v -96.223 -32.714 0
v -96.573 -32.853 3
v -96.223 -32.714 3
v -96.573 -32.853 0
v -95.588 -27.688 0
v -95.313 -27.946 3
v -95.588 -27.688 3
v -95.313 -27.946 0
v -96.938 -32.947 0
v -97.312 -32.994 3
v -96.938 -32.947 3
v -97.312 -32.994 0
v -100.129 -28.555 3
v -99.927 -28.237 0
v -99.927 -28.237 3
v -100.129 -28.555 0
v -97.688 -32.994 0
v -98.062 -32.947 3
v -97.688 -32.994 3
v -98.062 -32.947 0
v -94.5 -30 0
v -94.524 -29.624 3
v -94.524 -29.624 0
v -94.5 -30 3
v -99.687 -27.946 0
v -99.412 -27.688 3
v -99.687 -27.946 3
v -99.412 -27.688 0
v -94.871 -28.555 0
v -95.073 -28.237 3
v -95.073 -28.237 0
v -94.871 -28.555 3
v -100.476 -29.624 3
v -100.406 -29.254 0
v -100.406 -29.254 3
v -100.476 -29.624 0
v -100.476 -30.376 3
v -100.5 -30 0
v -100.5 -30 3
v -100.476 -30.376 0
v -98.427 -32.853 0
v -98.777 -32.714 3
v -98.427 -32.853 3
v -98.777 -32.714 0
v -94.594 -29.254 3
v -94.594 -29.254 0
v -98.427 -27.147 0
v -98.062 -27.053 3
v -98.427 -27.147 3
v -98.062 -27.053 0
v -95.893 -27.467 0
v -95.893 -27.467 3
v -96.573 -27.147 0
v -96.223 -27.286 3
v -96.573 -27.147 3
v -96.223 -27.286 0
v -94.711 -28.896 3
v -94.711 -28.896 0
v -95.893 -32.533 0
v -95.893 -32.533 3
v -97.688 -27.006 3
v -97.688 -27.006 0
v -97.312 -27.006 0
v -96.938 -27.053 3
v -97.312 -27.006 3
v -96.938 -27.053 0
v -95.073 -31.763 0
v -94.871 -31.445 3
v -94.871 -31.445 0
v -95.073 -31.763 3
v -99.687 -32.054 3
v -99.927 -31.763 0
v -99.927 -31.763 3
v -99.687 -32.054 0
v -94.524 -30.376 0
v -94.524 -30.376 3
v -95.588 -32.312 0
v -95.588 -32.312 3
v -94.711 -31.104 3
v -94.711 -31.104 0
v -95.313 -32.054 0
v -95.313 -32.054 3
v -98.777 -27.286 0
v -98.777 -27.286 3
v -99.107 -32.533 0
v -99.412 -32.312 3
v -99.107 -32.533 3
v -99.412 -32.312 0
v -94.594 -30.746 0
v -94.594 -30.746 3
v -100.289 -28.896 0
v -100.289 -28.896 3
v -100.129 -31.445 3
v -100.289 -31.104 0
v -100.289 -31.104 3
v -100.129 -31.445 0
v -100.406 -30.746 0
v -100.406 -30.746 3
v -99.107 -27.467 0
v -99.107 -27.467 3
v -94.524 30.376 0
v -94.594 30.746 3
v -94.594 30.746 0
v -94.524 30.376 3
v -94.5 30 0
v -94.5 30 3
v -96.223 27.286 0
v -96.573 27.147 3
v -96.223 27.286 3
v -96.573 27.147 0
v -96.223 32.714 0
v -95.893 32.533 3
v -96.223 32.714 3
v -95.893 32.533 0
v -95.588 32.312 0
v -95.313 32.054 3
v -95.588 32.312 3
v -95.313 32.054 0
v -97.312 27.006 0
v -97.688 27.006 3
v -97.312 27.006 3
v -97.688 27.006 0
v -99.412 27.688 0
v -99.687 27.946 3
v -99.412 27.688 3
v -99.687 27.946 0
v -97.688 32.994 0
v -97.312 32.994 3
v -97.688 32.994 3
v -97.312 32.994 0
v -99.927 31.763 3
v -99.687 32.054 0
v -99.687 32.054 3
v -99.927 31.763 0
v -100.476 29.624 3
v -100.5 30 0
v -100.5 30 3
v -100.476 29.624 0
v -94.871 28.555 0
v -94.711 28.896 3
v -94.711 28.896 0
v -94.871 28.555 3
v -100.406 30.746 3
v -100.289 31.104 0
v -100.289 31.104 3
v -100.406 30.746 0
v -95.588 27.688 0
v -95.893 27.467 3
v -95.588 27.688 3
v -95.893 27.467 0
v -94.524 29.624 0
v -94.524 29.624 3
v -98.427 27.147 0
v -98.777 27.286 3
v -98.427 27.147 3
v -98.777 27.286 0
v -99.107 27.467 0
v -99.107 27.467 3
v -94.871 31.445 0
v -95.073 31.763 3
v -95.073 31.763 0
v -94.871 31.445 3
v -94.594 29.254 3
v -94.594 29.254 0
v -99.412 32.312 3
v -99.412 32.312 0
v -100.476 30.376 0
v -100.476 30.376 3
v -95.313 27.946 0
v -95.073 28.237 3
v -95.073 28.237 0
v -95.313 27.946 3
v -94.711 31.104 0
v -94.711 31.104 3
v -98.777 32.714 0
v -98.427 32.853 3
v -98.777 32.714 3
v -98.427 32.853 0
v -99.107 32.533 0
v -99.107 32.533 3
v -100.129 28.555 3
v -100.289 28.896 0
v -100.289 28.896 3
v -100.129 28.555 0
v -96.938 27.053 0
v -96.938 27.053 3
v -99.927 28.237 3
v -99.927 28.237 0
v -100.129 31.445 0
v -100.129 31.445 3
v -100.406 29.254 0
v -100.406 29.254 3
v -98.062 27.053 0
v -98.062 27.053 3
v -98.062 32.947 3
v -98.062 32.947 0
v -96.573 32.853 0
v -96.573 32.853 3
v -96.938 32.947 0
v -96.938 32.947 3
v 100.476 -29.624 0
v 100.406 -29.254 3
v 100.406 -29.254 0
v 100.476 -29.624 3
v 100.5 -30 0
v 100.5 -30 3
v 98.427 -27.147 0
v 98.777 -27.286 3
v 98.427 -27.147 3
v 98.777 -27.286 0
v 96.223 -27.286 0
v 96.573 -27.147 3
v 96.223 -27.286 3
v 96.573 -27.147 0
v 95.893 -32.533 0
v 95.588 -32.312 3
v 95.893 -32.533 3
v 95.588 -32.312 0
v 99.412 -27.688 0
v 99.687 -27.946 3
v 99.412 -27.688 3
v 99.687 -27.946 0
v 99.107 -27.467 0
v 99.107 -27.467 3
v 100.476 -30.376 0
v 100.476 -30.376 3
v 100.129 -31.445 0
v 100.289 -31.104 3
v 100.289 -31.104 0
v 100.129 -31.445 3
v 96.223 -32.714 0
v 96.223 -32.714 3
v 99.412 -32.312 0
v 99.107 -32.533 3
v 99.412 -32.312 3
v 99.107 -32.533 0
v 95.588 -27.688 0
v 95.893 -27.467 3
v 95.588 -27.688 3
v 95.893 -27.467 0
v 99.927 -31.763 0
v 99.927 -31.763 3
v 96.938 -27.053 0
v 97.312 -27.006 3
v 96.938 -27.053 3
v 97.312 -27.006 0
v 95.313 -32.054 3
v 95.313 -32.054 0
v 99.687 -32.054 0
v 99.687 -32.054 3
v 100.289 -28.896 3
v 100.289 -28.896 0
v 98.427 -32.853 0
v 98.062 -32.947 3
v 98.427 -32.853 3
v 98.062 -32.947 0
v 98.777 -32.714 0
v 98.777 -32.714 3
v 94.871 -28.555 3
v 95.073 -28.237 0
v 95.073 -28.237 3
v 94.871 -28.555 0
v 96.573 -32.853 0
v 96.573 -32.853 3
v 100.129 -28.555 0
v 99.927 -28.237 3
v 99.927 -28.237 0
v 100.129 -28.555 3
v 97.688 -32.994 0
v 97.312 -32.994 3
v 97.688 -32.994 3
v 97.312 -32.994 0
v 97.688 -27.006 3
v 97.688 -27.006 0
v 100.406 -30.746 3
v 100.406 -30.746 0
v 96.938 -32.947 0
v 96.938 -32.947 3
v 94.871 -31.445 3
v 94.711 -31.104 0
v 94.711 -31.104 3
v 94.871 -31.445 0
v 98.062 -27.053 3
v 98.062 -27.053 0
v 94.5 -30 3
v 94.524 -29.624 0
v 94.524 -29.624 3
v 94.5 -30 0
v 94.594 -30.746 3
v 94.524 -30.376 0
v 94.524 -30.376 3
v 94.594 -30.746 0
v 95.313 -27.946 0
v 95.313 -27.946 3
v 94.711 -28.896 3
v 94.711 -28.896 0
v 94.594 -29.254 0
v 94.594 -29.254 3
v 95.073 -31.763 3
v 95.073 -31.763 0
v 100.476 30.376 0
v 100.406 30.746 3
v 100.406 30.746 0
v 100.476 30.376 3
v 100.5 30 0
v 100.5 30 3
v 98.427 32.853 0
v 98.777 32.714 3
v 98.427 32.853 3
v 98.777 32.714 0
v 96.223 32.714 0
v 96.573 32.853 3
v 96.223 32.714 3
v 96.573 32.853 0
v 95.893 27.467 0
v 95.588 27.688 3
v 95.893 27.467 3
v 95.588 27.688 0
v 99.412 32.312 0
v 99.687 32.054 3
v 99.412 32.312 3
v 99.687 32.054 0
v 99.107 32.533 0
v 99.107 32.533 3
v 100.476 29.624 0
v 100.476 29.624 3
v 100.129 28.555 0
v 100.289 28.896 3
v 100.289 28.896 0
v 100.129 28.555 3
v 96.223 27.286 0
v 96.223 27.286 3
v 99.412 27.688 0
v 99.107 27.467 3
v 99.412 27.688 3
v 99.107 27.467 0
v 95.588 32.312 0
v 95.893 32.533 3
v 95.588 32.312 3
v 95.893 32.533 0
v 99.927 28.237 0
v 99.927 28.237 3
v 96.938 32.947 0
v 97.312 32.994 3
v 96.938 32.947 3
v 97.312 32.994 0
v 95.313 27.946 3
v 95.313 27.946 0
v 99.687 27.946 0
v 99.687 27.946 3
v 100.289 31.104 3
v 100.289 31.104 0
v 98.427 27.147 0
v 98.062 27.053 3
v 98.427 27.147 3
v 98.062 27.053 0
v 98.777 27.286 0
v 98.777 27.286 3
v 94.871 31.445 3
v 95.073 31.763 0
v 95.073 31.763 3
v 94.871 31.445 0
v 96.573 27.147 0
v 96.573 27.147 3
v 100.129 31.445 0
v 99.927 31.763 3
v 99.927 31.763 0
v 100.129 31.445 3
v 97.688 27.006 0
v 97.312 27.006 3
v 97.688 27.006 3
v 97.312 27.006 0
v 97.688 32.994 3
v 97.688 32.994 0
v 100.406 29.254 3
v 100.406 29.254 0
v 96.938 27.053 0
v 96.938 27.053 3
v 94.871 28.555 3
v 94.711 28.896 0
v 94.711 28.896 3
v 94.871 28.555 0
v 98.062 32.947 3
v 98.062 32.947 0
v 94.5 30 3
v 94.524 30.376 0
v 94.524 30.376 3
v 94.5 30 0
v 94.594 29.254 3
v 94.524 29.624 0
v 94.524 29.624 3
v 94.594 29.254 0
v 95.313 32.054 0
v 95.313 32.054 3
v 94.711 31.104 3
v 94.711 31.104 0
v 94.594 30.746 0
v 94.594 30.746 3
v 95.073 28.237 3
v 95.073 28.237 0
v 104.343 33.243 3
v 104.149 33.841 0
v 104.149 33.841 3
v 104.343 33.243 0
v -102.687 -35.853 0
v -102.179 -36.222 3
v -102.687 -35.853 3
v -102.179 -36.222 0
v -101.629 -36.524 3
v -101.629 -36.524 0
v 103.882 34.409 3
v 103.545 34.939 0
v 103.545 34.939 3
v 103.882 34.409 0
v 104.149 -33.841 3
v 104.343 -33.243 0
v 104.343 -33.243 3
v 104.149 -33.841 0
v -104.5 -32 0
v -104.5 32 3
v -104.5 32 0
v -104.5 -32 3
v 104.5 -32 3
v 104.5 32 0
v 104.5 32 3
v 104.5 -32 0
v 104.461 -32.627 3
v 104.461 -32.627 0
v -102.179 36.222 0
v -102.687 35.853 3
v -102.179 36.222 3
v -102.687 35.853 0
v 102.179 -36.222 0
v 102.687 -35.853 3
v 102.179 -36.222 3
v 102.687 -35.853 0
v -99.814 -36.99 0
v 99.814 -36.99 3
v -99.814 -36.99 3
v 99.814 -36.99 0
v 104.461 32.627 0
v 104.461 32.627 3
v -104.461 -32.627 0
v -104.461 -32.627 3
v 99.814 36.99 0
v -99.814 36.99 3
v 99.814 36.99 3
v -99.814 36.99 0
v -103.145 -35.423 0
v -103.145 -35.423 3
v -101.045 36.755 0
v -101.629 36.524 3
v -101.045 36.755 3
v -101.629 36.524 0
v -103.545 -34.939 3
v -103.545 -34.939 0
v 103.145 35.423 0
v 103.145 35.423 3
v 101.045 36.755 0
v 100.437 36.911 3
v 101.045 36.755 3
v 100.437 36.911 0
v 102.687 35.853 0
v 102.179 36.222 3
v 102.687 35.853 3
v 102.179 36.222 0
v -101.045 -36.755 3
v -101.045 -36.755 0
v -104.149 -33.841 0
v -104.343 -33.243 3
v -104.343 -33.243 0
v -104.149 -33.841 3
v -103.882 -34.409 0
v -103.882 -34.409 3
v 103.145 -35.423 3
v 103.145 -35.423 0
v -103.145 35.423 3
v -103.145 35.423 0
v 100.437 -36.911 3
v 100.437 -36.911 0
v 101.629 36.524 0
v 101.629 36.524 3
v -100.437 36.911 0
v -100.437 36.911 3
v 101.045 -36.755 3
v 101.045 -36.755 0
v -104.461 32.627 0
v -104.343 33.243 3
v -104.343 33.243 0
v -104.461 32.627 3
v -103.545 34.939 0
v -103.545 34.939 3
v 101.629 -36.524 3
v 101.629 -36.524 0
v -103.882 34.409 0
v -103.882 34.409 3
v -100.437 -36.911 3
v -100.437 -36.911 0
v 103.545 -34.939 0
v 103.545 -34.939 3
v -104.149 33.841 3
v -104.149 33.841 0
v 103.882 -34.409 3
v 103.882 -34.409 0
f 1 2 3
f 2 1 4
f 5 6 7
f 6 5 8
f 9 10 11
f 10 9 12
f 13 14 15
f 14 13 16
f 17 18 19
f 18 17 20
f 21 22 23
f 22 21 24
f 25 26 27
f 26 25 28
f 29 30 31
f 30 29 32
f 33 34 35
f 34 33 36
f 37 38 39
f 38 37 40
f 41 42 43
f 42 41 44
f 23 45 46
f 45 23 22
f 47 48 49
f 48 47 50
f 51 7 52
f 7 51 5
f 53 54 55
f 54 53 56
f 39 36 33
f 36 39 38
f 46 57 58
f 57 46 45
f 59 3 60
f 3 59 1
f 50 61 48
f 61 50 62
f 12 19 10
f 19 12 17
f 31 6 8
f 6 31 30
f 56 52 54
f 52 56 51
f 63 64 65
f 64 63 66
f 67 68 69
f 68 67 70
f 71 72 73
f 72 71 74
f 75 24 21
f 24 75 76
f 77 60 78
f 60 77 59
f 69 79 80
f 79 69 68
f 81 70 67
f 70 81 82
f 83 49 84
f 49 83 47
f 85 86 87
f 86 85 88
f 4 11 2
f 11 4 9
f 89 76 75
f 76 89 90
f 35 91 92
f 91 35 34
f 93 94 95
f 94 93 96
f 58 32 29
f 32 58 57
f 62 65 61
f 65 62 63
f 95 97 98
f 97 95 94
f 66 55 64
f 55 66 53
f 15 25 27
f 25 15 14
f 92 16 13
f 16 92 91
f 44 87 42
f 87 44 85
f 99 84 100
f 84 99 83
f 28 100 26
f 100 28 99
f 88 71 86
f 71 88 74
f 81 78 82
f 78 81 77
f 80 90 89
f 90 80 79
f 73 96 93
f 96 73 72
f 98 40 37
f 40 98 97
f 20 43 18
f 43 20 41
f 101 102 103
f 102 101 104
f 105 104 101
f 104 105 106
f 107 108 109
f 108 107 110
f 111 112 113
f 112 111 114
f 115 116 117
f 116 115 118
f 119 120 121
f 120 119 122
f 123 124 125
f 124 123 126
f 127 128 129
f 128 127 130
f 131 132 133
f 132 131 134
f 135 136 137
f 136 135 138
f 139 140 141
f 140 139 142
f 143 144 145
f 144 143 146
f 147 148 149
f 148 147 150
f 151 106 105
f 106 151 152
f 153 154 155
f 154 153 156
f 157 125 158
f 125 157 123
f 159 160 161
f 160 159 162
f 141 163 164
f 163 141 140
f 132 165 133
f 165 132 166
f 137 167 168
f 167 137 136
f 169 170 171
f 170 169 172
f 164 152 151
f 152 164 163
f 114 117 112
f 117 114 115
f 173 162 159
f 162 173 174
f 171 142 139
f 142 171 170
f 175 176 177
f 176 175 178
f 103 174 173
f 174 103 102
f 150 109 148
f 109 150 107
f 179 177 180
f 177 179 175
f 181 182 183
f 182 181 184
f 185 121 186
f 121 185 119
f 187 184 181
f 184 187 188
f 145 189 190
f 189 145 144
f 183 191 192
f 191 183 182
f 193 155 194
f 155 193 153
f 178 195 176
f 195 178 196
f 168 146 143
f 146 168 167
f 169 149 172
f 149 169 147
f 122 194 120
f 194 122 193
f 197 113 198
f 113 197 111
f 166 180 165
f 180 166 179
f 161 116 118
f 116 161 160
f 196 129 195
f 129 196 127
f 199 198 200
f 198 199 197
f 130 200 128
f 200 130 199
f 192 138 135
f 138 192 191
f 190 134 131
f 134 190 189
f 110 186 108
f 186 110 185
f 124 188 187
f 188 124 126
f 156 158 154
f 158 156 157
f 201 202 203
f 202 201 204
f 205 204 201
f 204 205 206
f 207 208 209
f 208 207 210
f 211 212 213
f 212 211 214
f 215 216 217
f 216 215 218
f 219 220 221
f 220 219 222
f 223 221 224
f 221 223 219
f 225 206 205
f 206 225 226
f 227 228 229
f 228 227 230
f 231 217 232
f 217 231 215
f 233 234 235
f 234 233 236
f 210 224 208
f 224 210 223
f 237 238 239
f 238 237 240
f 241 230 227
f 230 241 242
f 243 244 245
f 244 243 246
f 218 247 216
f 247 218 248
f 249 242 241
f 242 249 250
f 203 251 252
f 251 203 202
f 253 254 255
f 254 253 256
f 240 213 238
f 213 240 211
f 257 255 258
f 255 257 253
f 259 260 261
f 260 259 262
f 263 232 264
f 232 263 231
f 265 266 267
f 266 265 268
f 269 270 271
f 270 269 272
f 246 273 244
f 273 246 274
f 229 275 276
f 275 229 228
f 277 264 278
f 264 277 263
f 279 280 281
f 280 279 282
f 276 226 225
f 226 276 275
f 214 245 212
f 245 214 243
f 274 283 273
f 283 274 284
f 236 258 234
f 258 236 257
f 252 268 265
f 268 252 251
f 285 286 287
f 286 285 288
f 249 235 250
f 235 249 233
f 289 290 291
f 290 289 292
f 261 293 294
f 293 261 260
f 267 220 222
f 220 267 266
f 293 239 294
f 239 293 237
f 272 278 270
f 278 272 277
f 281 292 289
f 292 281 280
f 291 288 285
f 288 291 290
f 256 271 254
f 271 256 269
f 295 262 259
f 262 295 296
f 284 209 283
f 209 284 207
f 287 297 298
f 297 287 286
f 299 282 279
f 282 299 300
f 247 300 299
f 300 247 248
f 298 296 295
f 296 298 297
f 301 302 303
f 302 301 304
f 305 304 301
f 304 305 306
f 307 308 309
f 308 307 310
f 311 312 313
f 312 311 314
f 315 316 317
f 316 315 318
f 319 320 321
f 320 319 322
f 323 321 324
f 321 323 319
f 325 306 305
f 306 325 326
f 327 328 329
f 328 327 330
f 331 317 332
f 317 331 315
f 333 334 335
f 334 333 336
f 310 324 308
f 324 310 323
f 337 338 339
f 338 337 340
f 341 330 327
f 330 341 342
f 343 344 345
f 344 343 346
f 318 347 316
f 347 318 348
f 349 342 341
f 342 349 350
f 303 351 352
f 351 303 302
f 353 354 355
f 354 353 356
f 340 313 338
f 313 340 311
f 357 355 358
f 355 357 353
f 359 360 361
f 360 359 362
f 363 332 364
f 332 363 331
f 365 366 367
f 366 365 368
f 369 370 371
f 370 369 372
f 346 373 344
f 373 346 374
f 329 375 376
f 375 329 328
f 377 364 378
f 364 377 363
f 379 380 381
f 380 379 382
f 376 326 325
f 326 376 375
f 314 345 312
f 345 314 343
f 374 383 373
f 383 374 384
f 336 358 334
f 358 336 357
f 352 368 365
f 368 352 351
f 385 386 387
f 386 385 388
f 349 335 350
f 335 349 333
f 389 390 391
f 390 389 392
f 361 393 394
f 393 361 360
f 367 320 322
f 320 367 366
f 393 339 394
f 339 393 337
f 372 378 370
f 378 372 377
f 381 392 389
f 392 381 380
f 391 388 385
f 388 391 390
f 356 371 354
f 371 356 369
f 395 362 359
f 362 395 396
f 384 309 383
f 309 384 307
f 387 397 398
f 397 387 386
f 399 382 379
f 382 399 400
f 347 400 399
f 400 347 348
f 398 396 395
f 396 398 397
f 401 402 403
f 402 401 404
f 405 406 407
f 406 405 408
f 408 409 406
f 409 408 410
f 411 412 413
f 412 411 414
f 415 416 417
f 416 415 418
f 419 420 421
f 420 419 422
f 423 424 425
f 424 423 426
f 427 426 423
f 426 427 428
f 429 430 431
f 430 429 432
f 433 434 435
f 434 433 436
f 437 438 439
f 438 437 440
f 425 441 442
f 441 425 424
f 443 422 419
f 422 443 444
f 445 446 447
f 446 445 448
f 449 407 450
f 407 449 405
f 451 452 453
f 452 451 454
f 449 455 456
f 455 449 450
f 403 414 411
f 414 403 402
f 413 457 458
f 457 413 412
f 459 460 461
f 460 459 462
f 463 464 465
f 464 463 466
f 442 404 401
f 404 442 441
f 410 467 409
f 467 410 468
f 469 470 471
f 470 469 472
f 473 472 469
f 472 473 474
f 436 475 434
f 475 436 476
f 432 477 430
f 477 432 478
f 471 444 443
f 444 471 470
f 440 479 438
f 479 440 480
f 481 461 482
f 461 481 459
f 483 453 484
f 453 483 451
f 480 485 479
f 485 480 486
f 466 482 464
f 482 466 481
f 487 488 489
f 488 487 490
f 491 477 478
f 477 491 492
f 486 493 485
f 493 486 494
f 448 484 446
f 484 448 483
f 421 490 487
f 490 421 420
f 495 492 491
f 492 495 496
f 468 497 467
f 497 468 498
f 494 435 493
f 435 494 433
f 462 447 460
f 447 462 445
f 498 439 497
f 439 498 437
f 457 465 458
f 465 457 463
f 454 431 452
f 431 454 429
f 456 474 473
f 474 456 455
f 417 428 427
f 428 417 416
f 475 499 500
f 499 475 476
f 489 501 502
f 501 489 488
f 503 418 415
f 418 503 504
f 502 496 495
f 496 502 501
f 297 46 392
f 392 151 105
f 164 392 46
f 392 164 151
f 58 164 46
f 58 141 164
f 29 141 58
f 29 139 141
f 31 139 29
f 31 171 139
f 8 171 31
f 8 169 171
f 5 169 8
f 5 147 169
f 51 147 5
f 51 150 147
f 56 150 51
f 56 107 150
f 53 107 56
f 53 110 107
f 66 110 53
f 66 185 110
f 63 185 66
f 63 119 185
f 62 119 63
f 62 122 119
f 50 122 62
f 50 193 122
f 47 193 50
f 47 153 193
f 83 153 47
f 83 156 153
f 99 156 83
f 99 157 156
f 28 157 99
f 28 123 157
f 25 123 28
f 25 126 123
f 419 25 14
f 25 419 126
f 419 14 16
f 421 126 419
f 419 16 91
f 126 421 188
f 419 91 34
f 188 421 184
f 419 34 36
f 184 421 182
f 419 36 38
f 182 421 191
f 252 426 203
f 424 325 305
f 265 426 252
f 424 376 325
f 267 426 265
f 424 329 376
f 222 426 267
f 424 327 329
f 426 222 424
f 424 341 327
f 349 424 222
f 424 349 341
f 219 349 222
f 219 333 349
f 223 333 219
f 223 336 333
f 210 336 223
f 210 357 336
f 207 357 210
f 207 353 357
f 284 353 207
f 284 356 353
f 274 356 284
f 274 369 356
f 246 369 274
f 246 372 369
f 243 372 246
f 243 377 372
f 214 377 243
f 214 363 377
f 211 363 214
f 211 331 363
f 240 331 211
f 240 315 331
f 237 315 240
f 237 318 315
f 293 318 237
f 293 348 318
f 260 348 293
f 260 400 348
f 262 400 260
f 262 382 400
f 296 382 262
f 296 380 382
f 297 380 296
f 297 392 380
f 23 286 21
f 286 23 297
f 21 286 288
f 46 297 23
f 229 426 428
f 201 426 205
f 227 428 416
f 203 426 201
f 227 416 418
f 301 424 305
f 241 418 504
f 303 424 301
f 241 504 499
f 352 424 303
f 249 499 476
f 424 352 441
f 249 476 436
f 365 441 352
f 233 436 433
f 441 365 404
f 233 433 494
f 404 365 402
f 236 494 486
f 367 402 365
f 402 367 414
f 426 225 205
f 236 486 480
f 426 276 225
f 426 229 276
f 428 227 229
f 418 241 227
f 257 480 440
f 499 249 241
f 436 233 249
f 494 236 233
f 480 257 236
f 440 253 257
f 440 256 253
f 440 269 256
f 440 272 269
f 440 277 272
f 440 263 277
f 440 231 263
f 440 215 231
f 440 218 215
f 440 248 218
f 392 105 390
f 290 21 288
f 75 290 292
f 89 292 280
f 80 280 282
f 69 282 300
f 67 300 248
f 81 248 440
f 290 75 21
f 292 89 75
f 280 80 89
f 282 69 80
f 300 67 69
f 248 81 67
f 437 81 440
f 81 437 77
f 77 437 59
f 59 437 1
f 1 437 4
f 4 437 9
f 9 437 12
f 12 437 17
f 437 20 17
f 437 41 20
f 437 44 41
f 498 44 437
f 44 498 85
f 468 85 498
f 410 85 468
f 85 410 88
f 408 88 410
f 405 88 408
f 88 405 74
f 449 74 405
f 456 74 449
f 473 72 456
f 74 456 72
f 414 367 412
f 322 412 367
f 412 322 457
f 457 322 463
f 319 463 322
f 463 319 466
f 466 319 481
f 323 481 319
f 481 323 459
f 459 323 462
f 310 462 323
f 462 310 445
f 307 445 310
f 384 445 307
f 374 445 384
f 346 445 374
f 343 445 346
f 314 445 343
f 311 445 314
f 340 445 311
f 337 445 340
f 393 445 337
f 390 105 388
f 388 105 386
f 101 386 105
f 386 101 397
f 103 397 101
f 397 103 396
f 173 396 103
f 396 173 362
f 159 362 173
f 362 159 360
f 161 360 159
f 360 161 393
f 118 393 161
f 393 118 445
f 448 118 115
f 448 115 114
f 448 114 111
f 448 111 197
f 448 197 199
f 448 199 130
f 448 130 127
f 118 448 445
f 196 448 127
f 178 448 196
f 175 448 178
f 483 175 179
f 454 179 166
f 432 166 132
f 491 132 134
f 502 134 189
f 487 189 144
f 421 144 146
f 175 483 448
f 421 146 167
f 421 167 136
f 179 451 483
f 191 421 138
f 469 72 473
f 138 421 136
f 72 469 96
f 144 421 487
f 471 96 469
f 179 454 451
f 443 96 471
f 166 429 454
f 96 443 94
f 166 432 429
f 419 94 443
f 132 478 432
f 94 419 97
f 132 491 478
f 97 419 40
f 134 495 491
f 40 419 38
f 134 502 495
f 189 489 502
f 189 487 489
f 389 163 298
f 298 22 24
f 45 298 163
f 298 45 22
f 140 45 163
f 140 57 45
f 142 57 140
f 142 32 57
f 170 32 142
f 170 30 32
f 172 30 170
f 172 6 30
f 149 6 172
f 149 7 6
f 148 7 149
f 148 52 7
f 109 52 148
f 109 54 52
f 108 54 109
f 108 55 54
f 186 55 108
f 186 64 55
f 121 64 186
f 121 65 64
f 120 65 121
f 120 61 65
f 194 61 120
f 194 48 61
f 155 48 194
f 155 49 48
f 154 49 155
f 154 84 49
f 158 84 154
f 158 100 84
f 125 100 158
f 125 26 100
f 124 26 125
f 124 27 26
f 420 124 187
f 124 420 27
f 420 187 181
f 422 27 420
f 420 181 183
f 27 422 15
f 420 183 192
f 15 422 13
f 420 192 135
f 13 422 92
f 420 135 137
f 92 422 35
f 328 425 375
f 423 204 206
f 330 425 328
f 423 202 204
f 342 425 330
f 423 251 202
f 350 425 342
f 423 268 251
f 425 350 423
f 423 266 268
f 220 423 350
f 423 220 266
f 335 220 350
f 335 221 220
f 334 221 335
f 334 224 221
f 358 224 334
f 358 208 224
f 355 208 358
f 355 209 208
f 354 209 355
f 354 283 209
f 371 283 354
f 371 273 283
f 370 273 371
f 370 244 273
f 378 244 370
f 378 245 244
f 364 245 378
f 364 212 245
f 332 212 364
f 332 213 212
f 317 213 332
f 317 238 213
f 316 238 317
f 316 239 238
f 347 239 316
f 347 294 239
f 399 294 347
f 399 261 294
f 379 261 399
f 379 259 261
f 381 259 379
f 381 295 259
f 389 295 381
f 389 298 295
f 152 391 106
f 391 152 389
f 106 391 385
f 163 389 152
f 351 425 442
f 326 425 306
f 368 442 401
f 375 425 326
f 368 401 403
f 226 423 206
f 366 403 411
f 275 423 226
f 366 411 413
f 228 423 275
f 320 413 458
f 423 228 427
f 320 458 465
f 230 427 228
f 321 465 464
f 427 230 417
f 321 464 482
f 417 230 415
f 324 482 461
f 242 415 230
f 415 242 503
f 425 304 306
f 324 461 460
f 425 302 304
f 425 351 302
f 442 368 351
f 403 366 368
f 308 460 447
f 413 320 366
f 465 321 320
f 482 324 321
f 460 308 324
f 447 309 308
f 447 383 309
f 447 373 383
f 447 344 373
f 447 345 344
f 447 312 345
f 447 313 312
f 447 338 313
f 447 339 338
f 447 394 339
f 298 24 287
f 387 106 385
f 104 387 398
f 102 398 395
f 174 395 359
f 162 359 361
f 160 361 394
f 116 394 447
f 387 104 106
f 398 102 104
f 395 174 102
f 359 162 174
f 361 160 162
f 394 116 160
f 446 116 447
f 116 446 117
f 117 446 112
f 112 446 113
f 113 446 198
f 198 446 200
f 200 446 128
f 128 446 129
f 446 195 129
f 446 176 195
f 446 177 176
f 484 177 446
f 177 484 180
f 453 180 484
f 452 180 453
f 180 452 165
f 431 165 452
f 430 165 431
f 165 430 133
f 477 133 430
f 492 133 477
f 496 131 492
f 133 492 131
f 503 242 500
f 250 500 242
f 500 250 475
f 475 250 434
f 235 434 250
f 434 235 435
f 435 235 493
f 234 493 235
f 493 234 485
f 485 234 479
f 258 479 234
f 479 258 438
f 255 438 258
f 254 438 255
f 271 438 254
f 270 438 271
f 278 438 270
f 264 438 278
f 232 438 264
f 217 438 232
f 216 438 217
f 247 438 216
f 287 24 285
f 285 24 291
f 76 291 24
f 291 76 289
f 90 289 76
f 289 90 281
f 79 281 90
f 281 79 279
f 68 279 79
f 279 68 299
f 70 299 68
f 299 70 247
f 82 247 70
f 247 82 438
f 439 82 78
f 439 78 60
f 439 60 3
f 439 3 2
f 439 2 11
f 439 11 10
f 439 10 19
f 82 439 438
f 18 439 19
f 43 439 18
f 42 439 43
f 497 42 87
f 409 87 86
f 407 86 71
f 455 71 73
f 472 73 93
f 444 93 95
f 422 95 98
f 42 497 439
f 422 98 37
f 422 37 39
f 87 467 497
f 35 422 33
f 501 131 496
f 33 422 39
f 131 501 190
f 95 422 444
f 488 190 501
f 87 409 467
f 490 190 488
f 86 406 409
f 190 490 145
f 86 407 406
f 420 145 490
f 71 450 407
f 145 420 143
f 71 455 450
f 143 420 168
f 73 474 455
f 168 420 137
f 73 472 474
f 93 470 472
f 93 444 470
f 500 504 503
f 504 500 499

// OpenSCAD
$fn = 50;


difference() {
	union() {
		hull() {
			translate(v = [-99.5000000000, 32.0000000000, 0]) {
				cylinder(h = 3, r = 5);
			}
			translate(v = [99.5000000000, 32.0000000000, 0]) {
				cylinder(h = 3, r = 5);
			}
			translate(v = [-99.5000000000, -32.0000000000, 0]) {
				cylinder(h = 3, r = 5);
			}
			translate(v = [99.5000000000, -32.0000000000, 0]) {
				cylinder(h = 3, r = 5);
			}
		}
	}
	union() {
		translate(v = [-97.5000000000, -30.0000000000, -100.0000000000]) {
			cylinder(h = 200, r = 3.0000000000);
		}
		translate(v = [-97.5000000000, 30.0000000000, -100.0000000000]) {
			cylinder(h = 200, r = 3.0000000000);
		}
		translate(v = [97.5000000000, -30.0000000000, -100.0000000000]) {
			cylinder(h = 200, r = 3.0000000000);
		}
		translate(v = [97.5000000000, 30.0000000000, -100.0000000000]) {
			cylinder(h = 200, r = 3.0000000000);
		}
	}
}
